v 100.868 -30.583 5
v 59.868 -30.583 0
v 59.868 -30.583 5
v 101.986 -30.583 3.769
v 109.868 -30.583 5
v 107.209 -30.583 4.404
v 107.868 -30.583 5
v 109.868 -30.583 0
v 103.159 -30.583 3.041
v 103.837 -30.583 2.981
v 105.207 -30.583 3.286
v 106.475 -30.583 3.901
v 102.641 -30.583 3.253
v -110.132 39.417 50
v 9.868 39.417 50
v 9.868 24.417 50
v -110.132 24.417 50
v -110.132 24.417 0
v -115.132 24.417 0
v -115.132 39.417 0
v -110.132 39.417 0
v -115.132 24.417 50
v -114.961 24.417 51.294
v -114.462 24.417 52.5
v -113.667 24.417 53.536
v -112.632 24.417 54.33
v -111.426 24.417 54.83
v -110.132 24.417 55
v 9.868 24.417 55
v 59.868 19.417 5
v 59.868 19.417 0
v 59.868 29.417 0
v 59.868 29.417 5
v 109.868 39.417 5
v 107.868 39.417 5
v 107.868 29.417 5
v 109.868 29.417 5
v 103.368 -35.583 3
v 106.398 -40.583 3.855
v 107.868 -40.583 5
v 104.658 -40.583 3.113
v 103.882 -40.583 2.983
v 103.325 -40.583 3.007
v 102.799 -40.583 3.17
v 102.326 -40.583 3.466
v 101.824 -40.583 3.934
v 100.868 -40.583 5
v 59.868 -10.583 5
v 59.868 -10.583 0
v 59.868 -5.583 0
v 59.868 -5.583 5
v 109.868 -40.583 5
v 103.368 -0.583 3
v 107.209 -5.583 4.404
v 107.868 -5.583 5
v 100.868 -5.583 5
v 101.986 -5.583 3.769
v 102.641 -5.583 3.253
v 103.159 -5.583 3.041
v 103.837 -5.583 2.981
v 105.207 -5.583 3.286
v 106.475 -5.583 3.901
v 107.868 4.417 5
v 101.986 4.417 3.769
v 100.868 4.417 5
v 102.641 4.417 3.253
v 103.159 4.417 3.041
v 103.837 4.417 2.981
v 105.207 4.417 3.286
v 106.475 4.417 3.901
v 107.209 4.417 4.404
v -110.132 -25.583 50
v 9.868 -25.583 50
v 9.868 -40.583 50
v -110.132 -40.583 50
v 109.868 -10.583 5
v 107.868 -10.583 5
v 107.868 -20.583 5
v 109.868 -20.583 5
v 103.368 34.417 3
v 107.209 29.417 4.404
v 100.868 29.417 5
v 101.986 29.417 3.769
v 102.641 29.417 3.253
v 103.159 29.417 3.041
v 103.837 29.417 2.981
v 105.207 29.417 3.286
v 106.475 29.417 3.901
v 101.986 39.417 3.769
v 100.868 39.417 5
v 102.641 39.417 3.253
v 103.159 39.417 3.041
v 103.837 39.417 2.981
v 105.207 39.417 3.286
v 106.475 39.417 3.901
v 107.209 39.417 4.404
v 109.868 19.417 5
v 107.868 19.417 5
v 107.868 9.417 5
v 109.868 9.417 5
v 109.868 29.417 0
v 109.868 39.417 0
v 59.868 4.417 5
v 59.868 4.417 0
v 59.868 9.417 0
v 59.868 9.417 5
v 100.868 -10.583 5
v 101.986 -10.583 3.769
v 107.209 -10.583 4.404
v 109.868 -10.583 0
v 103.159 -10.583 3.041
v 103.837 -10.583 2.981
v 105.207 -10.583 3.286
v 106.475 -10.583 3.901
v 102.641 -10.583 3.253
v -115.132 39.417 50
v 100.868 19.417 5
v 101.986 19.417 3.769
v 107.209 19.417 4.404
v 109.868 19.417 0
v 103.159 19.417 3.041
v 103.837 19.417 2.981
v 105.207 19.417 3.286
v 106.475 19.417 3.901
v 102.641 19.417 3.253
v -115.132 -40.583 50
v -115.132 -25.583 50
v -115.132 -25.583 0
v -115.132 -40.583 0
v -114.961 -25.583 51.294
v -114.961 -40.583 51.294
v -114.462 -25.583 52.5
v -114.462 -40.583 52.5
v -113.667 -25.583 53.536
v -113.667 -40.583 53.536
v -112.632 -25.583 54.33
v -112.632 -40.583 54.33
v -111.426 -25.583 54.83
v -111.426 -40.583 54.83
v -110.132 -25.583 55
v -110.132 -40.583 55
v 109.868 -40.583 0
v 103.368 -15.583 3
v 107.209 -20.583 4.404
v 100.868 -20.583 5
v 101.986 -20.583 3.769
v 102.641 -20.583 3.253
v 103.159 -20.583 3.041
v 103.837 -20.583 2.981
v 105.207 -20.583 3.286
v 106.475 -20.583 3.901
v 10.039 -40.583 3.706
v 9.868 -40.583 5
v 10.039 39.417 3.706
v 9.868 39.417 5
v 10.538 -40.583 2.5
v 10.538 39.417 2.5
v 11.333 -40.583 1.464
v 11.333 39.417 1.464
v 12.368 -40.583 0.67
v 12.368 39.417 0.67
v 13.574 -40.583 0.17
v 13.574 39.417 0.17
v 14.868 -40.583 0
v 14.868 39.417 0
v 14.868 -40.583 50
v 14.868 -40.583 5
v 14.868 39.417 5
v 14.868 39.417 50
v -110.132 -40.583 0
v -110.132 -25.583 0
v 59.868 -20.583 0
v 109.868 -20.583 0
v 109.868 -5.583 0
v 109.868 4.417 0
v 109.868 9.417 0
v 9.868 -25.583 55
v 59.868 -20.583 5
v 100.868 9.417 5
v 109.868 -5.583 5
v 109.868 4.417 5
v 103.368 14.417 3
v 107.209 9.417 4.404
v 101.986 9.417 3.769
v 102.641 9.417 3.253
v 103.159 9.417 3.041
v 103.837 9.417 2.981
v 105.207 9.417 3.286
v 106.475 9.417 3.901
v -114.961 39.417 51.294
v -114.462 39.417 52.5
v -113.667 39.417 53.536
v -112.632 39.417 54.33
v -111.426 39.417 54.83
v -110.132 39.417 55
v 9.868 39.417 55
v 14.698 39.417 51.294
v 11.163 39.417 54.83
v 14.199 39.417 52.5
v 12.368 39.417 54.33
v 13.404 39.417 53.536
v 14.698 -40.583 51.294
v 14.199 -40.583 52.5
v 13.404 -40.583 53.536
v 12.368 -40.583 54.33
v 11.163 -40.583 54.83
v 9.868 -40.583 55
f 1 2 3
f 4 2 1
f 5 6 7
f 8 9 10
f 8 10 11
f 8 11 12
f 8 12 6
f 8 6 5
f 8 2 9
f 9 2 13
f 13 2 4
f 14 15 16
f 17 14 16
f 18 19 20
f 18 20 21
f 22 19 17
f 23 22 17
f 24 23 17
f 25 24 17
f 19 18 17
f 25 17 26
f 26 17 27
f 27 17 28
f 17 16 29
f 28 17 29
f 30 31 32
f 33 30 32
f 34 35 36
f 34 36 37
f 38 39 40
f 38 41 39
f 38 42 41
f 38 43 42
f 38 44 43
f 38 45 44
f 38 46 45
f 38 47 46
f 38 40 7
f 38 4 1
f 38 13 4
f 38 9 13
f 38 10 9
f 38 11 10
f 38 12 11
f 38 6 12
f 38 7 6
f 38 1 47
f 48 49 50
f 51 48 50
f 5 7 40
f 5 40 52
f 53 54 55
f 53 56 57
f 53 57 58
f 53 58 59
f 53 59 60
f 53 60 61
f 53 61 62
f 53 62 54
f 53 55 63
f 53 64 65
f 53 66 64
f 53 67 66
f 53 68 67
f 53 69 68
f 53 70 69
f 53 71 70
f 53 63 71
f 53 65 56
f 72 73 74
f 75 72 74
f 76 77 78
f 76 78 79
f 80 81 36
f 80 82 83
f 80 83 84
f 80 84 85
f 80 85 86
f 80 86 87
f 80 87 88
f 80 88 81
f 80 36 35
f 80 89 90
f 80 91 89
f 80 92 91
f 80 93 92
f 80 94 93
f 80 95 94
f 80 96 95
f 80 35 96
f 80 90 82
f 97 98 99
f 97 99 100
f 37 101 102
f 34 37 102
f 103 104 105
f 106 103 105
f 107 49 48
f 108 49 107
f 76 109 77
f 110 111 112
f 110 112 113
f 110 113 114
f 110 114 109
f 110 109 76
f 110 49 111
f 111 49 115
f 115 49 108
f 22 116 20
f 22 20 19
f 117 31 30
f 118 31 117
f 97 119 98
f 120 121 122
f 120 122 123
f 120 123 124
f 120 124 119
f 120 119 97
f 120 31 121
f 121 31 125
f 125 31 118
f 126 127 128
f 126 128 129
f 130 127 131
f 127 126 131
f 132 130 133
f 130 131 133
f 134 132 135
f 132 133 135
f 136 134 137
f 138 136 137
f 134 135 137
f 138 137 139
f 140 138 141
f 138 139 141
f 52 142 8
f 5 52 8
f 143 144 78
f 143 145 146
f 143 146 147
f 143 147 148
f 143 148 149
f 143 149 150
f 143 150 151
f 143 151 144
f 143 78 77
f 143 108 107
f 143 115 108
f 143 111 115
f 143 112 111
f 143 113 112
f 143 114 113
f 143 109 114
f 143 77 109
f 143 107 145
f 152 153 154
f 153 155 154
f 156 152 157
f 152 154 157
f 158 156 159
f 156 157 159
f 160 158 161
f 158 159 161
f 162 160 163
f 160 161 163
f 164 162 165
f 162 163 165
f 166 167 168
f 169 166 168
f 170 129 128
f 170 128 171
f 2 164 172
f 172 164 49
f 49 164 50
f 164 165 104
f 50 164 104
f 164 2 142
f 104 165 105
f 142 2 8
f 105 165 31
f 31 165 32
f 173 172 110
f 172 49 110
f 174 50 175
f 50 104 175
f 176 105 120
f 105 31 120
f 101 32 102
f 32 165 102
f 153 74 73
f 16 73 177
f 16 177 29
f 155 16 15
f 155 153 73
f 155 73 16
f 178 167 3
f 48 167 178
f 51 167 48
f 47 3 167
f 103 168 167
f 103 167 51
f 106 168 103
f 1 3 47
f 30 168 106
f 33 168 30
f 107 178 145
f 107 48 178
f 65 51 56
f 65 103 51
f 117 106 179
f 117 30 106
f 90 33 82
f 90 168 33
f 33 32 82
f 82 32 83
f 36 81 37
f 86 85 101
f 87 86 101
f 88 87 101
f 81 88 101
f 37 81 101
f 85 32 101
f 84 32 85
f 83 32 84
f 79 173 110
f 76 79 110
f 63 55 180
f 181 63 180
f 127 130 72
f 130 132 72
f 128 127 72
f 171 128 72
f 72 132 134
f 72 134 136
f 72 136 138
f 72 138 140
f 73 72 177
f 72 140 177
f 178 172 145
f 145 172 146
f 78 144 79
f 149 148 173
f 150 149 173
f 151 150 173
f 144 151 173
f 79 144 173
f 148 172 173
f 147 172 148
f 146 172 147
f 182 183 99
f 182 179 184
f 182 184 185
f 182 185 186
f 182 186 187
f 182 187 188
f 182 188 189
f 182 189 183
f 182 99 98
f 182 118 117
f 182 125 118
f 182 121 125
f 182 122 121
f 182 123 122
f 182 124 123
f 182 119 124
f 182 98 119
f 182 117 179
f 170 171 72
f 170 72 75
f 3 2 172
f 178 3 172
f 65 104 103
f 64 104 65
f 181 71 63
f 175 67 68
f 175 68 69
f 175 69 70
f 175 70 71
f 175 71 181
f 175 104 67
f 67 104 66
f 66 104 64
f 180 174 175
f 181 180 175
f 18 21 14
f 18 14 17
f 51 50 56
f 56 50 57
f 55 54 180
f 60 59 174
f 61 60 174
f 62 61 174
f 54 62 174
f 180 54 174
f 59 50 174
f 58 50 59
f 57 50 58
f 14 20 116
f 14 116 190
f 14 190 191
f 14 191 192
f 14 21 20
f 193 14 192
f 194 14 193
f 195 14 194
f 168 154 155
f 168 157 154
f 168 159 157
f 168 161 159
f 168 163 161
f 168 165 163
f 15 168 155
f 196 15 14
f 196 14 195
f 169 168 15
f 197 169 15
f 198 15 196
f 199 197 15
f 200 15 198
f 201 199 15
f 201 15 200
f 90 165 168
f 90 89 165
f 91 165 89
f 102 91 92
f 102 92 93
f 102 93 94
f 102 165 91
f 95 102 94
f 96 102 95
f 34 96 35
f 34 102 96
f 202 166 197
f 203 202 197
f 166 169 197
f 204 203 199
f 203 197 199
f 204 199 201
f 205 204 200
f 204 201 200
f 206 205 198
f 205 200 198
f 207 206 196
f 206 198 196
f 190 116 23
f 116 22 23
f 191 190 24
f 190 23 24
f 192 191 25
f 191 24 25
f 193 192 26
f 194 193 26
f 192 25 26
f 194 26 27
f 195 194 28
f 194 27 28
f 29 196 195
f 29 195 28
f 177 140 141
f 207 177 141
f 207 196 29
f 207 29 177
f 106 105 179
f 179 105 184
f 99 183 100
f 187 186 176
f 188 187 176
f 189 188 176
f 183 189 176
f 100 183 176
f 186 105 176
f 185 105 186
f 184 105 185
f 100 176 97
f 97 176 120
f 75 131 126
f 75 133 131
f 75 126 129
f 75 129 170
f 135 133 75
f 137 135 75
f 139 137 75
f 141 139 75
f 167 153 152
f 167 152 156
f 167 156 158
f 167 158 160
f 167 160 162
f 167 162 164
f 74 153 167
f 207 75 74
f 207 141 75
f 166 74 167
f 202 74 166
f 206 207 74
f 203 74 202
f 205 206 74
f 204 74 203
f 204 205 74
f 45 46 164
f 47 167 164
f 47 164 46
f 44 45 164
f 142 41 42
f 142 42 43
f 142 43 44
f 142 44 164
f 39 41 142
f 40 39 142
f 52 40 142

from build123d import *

# Parameters (mm, degrees)
F0_W      = 50
F0_H      = 10
F1_DEPTH  = 5
F0_W_2    = 5
F0_H_2    = 80
F2_DEPTH  = 55
F3_W      = 15
F3_H      = 5
F4_DEPTH  = 125
F6_W      = 5
F6_H      = 15
F5_W      = 5
F5_H      = 15
F7_DEPTH  = 50
F8_R      = 4.99999
F10_DEPTH = 80.001


# Not quite as in the source:
# - a fillet or chamfer is up to 0.001 mm smaller than in the source, because OpenCascade refuses the exact size


with BuildPart() as f1:
    # F0 (on Top) → F1 (new body)
    with BuildSketch(Plane.XY):
        Polygon((59.8684251308, 39.4171364857), (14.8684251308, 39.4171364857), (14.8684251308, -40.5828635143), (59.8684251308, -40.5828635143), (59.8684251308, -30.5828635143), (59.8684251308, -20.5828635143), (59.8684251308, -10.5828635143), (59.8684251308, -5.5828635143), (59.8684251308, 4.4171364857), (59.8684251308, 9.4171364857), (59.8684251308, 19.4171364857), (59.8684251308, 29.4171364857), align=None)
        with Locations((84.8684251308, -0.5828635143)):
            Rectangle(F0_W, F0_H)
        with Locations((84.8684251308, -35.5828635143)):
            Rectangle(F0_W, F0_H)
        with Locations((84.8684251308, 14.4171364857)):
            Rectangle(F0_W, F0_H)
        with Locations((84.8684251308, 34.4171364857)):
            Rectangle(F0_W, F0_H)
        with Locations((84.8684251308, -15.5828635143)):
            Rectangle(F0_W, F0_H)
    extrude(amount=F1_DEPTH)

    # F0 (on Top) → F2 (join)
    with BuildSketch(Plane.XY):
        with Locations((12.3684251308, -0.5828635143)):
            Rectangle(F0_W_2, F0_H_2)
    extrude(amount=F2_DEPTH)

    # F3 (on face) → F4 (join)
    with BuildSketch(Plane(origin=(9.8684251308, 0, 0), x_dir=(0, -1, 0), z_dir=(-1, 0, 0))):
        with Locations((-31.9171364857, 52.5)):
            Rectangle(F3_W, F3_H)
        with Locations((33.0828635143, 52.5)):
            Rectangle(F3_W, F3_H)
    extrude(amount=F4_DEPTH)

    # F6 (on face) + F5 (on face) → F7 (join)
    with BuildSketch(Plane(origin=(0, 0, 50), x_dir=(1, 0, 0), z_dir=(0, 0, -1))):
        with Locations((-112.6315748692, 33.0828635143)):
            Rectangle(F6_W, F6_H)
    with BuildSketch(Plane(origin=(0, 0, 50), x_dir=(1, 0, 0), z_dir=(0, 0, -1))):
        with Locations((-112.6315748692, -31.9171364857)):
            Rectangle(F5_W, F5_H)
    extrude(amount=F7_DEPTH)

    # F8 (radius 5 in the source; OpenCascade refuses exactly that, so slightly less here)
    f8_edges = [f1.edges().sort_by_distance(p)[0] for p in [
        (-115.131575, 31.917136, 55),
        (-115.131575, -33.082864, 55),
        (9.868425, -0.582864, 0),
        (14.868425, -0.582864, 55),
    ]]
    fillet(f8_edges, radius=F8_R)

    # F9 (on face) → F10 (cut, through all)
    with BuildSketch(Plane.XZ.offset(40.5828635143)):
        with BuildLine():
            add(Edge.make_bspline(
                [(107.8684251308, 5), (106.7611965953, 3.8240237002), (103.011923181, 1.9991854383), (101.7375563624, 4.0782074875), (100.8684251308, 5)],
                knots=[0, 0, 0, 0, 0.5536142678, 1, 1, 1, 1], degree=3))
            Line((107.8684251308, 5), (100.8684251308, 5))
        make_face()
    extrude(amount=-F10_DEPTH, mode=Mode.SUBTRACT)


solid = f1.part
